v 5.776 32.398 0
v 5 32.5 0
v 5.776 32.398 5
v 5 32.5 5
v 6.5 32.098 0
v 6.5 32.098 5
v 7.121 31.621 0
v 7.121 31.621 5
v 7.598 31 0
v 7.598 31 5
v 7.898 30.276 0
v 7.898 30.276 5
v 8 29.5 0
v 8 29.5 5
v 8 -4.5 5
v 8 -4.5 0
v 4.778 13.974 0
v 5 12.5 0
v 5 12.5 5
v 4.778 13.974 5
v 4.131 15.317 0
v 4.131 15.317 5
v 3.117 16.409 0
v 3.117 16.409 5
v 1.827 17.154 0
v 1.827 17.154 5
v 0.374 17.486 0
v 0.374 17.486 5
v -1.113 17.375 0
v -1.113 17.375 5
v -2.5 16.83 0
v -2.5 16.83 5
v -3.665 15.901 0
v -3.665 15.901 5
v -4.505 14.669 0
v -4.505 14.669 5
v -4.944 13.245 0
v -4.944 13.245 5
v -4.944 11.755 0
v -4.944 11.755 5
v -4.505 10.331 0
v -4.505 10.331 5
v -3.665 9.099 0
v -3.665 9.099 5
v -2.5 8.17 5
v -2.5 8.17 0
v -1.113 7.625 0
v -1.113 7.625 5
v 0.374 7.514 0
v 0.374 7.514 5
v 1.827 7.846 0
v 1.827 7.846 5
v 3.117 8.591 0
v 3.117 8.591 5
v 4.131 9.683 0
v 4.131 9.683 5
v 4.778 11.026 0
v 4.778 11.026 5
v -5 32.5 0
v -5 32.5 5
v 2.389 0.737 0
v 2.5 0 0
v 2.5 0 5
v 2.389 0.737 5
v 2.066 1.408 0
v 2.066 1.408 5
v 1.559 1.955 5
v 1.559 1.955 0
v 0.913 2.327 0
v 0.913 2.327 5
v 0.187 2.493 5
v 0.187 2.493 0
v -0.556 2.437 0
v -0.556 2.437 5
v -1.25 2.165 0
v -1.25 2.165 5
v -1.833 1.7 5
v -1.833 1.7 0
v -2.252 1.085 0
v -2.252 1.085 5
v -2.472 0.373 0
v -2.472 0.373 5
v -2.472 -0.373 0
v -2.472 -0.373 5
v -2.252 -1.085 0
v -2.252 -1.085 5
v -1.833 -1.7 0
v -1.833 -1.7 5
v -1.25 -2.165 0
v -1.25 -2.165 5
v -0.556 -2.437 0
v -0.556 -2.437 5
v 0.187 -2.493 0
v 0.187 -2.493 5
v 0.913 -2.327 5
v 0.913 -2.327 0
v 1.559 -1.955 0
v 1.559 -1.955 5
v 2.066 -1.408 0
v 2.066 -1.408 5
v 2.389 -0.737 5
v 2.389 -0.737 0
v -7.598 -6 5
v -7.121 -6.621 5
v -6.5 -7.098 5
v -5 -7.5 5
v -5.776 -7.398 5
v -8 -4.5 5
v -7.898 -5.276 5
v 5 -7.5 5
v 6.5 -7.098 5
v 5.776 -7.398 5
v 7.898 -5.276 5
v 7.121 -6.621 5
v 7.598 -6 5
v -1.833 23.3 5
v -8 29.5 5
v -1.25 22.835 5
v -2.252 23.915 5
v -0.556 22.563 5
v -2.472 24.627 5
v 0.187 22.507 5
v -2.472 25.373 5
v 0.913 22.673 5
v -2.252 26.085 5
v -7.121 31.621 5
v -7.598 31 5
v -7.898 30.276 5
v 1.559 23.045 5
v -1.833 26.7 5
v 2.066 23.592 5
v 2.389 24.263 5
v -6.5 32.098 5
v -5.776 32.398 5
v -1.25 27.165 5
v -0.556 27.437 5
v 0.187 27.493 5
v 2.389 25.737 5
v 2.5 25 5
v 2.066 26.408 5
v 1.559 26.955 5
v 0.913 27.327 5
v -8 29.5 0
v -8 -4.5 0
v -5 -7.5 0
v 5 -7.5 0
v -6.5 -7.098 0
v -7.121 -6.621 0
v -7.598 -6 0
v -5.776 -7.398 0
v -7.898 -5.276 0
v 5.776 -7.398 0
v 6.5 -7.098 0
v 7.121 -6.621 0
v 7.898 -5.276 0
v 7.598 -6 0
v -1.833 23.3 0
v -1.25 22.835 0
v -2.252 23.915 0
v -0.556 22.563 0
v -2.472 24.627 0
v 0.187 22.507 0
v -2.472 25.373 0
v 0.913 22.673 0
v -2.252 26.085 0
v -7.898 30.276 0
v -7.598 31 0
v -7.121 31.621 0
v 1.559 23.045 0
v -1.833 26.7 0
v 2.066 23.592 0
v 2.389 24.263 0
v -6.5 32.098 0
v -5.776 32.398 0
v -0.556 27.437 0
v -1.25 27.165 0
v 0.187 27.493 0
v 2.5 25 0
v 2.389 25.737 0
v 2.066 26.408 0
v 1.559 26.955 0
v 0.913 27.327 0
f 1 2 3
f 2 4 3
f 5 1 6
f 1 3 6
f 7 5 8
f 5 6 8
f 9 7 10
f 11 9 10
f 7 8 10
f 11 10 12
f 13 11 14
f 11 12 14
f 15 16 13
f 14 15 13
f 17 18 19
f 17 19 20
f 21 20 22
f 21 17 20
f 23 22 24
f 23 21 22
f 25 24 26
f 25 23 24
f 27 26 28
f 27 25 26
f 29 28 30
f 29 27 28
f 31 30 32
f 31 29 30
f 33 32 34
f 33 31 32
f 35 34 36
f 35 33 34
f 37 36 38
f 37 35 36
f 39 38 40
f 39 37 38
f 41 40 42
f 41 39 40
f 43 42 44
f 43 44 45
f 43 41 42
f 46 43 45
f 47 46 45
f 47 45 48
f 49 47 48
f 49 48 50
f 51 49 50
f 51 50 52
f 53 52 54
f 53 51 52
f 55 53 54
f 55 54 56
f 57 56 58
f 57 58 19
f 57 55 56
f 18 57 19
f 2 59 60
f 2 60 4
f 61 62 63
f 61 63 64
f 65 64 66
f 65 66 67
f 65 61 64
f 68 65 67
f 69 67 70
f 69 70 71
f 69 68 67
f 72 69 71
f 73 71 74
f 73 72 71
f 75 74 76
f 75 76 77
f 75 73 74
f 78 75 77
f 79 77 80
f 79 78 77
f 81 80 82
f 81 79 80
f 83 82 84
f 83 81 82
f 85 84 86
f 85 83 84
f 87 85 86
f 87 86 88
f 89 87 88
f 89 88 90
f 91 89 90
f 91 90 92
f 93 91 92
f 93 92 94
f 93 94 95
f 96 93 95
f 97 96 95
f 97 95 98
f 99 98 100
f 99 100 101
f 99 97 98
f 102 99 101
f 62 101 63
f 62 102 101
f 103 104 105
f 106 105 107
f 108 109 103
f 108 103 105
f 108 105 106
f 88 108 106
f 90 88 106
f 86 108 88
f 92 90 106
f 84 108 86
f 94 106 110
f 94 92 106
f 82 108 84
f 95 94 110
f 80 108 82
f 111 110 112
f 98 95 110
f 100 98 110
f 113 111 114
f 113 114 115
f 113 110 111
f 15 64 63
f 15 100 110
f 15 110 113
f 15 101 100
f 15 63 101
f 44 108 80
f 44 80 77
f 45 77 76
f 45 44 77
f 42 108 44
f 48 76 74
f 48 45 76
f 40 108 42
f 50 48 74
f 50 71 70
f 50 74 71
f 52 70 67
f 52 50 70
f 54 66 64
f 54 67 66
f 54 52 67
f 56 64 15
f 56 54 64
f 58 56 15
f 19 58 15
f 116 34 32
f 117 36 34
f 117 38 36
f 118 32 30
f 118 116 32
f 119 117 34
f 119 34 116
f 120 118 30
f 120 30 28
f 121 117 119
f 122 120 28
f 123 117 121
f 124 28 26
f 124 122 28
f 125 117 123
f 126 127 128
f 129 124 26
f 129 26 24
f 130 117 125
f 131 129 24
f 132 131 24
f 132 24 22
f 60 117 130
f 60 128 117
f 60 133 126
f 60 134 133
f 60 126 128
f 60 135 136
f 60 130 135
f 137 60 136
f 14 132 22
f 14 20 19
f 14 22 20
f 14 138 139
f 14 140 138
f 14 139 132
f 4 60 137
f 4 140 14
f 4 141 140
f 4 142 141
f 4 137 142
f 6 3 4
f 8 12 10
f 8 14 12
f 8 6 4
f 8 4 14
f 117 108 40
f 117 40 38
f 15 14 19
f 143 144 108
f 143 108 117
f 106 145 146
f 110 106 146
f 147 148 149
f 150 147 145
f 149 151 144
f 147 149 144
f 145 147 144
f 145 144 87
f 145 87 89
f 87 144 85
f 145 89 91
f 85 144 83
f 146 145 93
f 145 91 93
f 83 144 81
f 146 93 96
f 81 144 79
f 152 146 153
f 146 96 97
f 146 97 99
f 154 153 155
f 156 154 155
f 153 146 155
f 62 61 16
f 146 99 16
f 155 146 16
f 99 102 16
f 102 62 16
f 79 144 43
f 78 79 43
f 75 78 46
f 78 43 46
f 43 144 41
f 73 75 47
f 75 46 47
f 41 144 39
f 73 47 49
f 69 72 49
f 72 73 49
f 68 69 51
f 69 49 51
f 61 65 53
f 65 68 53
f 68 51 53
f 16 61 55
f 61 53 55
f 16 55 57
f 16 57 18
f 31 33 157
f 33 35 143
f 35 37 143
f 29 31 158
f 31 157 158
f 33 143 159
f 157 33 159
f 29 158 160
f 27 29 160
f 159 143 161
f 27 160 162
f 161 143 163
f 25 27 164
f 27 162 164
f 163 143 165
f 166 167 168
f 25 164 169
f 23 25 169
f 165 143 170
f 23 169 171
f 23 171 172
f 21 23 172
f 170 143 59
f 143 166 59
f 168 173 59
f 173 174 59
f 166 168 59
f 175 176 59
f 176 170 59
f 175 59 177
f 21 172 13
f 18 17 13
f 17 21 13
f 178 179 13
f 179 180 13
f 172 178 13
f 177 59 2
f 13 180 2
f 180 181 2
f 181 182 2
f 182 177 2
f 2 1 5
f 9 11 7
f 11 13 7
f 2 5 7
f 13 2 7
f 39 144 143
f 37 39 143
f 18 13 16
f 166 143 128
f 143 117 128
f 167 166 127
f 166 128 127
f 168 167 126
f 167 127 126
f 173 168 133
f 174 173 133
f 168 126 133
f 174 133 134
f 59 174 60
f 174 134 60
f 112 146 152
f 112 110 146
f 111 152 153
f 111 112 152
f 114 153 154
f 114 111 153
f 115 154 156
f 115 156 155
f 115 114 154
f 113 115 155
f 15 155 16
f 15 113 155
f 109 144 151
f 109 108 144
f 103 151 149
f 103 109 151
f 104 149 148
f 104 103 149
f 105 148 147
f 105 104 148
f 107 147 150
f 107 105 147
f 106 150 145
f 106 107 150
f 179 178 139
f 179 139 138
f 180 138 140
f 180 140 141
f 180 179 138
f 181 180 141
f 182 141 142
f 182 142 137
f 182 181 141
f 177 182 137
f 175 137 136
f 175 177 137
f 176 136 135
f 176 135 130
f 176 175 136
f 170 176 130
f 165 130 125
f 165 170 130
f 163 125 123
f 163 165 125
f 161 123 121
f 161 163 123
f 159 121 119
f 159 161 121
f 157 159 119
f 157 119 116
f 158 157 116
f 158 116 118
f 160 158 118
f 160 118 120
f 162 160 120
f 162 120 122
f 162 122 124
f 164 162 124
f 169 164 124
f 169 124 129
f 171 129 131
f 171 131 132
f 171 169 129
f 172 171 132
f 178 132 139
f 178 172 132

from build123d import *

# Parameters (mm, degrees)
SKETCH_1_W      = 16
SKETCH_1_H      = 40
SKETCH_1_R      = 2.5
SKETCH_1_R_2    = 5
EXTRUDE_1_DEPTH = 5
FILLET_1_R      = 3


with BuildPart() as part:
    # 草图1 → 凸台-拉伸1 (new body)
    with BuildSketch(Plane.XY):
        with Locations((0, 12.5)):
            Rectangle(SKETCH_1_W, SKETCH_1_H)
        with Locations((0, 25)):
            Circle(SKETCH_1_R, mode=Mode.SUBTRACT)
        Circle(SKETCH_1_R, mode=Mode.SUBTRACT)
        with Locations((0, 12.5)):
            Circle(SKETCH_1_R_2, mode=Mode.SUBTRACT)
    extrude(amount=EXTRUDE_1_DEPTH)

    # 圆角1
    fillet_1_edges = [part.edges().sort_by_distance(p)[0] for p in [
        (8, -7.5, 2.5),
        (-8, -7.5, 2.5),
        (-8, 32.5, 2.5),
        (8, 32.5, 2.5),
    ]]
    fillet(fillet_1_edges, radius=FILLET_1_R)


solid = part.part
